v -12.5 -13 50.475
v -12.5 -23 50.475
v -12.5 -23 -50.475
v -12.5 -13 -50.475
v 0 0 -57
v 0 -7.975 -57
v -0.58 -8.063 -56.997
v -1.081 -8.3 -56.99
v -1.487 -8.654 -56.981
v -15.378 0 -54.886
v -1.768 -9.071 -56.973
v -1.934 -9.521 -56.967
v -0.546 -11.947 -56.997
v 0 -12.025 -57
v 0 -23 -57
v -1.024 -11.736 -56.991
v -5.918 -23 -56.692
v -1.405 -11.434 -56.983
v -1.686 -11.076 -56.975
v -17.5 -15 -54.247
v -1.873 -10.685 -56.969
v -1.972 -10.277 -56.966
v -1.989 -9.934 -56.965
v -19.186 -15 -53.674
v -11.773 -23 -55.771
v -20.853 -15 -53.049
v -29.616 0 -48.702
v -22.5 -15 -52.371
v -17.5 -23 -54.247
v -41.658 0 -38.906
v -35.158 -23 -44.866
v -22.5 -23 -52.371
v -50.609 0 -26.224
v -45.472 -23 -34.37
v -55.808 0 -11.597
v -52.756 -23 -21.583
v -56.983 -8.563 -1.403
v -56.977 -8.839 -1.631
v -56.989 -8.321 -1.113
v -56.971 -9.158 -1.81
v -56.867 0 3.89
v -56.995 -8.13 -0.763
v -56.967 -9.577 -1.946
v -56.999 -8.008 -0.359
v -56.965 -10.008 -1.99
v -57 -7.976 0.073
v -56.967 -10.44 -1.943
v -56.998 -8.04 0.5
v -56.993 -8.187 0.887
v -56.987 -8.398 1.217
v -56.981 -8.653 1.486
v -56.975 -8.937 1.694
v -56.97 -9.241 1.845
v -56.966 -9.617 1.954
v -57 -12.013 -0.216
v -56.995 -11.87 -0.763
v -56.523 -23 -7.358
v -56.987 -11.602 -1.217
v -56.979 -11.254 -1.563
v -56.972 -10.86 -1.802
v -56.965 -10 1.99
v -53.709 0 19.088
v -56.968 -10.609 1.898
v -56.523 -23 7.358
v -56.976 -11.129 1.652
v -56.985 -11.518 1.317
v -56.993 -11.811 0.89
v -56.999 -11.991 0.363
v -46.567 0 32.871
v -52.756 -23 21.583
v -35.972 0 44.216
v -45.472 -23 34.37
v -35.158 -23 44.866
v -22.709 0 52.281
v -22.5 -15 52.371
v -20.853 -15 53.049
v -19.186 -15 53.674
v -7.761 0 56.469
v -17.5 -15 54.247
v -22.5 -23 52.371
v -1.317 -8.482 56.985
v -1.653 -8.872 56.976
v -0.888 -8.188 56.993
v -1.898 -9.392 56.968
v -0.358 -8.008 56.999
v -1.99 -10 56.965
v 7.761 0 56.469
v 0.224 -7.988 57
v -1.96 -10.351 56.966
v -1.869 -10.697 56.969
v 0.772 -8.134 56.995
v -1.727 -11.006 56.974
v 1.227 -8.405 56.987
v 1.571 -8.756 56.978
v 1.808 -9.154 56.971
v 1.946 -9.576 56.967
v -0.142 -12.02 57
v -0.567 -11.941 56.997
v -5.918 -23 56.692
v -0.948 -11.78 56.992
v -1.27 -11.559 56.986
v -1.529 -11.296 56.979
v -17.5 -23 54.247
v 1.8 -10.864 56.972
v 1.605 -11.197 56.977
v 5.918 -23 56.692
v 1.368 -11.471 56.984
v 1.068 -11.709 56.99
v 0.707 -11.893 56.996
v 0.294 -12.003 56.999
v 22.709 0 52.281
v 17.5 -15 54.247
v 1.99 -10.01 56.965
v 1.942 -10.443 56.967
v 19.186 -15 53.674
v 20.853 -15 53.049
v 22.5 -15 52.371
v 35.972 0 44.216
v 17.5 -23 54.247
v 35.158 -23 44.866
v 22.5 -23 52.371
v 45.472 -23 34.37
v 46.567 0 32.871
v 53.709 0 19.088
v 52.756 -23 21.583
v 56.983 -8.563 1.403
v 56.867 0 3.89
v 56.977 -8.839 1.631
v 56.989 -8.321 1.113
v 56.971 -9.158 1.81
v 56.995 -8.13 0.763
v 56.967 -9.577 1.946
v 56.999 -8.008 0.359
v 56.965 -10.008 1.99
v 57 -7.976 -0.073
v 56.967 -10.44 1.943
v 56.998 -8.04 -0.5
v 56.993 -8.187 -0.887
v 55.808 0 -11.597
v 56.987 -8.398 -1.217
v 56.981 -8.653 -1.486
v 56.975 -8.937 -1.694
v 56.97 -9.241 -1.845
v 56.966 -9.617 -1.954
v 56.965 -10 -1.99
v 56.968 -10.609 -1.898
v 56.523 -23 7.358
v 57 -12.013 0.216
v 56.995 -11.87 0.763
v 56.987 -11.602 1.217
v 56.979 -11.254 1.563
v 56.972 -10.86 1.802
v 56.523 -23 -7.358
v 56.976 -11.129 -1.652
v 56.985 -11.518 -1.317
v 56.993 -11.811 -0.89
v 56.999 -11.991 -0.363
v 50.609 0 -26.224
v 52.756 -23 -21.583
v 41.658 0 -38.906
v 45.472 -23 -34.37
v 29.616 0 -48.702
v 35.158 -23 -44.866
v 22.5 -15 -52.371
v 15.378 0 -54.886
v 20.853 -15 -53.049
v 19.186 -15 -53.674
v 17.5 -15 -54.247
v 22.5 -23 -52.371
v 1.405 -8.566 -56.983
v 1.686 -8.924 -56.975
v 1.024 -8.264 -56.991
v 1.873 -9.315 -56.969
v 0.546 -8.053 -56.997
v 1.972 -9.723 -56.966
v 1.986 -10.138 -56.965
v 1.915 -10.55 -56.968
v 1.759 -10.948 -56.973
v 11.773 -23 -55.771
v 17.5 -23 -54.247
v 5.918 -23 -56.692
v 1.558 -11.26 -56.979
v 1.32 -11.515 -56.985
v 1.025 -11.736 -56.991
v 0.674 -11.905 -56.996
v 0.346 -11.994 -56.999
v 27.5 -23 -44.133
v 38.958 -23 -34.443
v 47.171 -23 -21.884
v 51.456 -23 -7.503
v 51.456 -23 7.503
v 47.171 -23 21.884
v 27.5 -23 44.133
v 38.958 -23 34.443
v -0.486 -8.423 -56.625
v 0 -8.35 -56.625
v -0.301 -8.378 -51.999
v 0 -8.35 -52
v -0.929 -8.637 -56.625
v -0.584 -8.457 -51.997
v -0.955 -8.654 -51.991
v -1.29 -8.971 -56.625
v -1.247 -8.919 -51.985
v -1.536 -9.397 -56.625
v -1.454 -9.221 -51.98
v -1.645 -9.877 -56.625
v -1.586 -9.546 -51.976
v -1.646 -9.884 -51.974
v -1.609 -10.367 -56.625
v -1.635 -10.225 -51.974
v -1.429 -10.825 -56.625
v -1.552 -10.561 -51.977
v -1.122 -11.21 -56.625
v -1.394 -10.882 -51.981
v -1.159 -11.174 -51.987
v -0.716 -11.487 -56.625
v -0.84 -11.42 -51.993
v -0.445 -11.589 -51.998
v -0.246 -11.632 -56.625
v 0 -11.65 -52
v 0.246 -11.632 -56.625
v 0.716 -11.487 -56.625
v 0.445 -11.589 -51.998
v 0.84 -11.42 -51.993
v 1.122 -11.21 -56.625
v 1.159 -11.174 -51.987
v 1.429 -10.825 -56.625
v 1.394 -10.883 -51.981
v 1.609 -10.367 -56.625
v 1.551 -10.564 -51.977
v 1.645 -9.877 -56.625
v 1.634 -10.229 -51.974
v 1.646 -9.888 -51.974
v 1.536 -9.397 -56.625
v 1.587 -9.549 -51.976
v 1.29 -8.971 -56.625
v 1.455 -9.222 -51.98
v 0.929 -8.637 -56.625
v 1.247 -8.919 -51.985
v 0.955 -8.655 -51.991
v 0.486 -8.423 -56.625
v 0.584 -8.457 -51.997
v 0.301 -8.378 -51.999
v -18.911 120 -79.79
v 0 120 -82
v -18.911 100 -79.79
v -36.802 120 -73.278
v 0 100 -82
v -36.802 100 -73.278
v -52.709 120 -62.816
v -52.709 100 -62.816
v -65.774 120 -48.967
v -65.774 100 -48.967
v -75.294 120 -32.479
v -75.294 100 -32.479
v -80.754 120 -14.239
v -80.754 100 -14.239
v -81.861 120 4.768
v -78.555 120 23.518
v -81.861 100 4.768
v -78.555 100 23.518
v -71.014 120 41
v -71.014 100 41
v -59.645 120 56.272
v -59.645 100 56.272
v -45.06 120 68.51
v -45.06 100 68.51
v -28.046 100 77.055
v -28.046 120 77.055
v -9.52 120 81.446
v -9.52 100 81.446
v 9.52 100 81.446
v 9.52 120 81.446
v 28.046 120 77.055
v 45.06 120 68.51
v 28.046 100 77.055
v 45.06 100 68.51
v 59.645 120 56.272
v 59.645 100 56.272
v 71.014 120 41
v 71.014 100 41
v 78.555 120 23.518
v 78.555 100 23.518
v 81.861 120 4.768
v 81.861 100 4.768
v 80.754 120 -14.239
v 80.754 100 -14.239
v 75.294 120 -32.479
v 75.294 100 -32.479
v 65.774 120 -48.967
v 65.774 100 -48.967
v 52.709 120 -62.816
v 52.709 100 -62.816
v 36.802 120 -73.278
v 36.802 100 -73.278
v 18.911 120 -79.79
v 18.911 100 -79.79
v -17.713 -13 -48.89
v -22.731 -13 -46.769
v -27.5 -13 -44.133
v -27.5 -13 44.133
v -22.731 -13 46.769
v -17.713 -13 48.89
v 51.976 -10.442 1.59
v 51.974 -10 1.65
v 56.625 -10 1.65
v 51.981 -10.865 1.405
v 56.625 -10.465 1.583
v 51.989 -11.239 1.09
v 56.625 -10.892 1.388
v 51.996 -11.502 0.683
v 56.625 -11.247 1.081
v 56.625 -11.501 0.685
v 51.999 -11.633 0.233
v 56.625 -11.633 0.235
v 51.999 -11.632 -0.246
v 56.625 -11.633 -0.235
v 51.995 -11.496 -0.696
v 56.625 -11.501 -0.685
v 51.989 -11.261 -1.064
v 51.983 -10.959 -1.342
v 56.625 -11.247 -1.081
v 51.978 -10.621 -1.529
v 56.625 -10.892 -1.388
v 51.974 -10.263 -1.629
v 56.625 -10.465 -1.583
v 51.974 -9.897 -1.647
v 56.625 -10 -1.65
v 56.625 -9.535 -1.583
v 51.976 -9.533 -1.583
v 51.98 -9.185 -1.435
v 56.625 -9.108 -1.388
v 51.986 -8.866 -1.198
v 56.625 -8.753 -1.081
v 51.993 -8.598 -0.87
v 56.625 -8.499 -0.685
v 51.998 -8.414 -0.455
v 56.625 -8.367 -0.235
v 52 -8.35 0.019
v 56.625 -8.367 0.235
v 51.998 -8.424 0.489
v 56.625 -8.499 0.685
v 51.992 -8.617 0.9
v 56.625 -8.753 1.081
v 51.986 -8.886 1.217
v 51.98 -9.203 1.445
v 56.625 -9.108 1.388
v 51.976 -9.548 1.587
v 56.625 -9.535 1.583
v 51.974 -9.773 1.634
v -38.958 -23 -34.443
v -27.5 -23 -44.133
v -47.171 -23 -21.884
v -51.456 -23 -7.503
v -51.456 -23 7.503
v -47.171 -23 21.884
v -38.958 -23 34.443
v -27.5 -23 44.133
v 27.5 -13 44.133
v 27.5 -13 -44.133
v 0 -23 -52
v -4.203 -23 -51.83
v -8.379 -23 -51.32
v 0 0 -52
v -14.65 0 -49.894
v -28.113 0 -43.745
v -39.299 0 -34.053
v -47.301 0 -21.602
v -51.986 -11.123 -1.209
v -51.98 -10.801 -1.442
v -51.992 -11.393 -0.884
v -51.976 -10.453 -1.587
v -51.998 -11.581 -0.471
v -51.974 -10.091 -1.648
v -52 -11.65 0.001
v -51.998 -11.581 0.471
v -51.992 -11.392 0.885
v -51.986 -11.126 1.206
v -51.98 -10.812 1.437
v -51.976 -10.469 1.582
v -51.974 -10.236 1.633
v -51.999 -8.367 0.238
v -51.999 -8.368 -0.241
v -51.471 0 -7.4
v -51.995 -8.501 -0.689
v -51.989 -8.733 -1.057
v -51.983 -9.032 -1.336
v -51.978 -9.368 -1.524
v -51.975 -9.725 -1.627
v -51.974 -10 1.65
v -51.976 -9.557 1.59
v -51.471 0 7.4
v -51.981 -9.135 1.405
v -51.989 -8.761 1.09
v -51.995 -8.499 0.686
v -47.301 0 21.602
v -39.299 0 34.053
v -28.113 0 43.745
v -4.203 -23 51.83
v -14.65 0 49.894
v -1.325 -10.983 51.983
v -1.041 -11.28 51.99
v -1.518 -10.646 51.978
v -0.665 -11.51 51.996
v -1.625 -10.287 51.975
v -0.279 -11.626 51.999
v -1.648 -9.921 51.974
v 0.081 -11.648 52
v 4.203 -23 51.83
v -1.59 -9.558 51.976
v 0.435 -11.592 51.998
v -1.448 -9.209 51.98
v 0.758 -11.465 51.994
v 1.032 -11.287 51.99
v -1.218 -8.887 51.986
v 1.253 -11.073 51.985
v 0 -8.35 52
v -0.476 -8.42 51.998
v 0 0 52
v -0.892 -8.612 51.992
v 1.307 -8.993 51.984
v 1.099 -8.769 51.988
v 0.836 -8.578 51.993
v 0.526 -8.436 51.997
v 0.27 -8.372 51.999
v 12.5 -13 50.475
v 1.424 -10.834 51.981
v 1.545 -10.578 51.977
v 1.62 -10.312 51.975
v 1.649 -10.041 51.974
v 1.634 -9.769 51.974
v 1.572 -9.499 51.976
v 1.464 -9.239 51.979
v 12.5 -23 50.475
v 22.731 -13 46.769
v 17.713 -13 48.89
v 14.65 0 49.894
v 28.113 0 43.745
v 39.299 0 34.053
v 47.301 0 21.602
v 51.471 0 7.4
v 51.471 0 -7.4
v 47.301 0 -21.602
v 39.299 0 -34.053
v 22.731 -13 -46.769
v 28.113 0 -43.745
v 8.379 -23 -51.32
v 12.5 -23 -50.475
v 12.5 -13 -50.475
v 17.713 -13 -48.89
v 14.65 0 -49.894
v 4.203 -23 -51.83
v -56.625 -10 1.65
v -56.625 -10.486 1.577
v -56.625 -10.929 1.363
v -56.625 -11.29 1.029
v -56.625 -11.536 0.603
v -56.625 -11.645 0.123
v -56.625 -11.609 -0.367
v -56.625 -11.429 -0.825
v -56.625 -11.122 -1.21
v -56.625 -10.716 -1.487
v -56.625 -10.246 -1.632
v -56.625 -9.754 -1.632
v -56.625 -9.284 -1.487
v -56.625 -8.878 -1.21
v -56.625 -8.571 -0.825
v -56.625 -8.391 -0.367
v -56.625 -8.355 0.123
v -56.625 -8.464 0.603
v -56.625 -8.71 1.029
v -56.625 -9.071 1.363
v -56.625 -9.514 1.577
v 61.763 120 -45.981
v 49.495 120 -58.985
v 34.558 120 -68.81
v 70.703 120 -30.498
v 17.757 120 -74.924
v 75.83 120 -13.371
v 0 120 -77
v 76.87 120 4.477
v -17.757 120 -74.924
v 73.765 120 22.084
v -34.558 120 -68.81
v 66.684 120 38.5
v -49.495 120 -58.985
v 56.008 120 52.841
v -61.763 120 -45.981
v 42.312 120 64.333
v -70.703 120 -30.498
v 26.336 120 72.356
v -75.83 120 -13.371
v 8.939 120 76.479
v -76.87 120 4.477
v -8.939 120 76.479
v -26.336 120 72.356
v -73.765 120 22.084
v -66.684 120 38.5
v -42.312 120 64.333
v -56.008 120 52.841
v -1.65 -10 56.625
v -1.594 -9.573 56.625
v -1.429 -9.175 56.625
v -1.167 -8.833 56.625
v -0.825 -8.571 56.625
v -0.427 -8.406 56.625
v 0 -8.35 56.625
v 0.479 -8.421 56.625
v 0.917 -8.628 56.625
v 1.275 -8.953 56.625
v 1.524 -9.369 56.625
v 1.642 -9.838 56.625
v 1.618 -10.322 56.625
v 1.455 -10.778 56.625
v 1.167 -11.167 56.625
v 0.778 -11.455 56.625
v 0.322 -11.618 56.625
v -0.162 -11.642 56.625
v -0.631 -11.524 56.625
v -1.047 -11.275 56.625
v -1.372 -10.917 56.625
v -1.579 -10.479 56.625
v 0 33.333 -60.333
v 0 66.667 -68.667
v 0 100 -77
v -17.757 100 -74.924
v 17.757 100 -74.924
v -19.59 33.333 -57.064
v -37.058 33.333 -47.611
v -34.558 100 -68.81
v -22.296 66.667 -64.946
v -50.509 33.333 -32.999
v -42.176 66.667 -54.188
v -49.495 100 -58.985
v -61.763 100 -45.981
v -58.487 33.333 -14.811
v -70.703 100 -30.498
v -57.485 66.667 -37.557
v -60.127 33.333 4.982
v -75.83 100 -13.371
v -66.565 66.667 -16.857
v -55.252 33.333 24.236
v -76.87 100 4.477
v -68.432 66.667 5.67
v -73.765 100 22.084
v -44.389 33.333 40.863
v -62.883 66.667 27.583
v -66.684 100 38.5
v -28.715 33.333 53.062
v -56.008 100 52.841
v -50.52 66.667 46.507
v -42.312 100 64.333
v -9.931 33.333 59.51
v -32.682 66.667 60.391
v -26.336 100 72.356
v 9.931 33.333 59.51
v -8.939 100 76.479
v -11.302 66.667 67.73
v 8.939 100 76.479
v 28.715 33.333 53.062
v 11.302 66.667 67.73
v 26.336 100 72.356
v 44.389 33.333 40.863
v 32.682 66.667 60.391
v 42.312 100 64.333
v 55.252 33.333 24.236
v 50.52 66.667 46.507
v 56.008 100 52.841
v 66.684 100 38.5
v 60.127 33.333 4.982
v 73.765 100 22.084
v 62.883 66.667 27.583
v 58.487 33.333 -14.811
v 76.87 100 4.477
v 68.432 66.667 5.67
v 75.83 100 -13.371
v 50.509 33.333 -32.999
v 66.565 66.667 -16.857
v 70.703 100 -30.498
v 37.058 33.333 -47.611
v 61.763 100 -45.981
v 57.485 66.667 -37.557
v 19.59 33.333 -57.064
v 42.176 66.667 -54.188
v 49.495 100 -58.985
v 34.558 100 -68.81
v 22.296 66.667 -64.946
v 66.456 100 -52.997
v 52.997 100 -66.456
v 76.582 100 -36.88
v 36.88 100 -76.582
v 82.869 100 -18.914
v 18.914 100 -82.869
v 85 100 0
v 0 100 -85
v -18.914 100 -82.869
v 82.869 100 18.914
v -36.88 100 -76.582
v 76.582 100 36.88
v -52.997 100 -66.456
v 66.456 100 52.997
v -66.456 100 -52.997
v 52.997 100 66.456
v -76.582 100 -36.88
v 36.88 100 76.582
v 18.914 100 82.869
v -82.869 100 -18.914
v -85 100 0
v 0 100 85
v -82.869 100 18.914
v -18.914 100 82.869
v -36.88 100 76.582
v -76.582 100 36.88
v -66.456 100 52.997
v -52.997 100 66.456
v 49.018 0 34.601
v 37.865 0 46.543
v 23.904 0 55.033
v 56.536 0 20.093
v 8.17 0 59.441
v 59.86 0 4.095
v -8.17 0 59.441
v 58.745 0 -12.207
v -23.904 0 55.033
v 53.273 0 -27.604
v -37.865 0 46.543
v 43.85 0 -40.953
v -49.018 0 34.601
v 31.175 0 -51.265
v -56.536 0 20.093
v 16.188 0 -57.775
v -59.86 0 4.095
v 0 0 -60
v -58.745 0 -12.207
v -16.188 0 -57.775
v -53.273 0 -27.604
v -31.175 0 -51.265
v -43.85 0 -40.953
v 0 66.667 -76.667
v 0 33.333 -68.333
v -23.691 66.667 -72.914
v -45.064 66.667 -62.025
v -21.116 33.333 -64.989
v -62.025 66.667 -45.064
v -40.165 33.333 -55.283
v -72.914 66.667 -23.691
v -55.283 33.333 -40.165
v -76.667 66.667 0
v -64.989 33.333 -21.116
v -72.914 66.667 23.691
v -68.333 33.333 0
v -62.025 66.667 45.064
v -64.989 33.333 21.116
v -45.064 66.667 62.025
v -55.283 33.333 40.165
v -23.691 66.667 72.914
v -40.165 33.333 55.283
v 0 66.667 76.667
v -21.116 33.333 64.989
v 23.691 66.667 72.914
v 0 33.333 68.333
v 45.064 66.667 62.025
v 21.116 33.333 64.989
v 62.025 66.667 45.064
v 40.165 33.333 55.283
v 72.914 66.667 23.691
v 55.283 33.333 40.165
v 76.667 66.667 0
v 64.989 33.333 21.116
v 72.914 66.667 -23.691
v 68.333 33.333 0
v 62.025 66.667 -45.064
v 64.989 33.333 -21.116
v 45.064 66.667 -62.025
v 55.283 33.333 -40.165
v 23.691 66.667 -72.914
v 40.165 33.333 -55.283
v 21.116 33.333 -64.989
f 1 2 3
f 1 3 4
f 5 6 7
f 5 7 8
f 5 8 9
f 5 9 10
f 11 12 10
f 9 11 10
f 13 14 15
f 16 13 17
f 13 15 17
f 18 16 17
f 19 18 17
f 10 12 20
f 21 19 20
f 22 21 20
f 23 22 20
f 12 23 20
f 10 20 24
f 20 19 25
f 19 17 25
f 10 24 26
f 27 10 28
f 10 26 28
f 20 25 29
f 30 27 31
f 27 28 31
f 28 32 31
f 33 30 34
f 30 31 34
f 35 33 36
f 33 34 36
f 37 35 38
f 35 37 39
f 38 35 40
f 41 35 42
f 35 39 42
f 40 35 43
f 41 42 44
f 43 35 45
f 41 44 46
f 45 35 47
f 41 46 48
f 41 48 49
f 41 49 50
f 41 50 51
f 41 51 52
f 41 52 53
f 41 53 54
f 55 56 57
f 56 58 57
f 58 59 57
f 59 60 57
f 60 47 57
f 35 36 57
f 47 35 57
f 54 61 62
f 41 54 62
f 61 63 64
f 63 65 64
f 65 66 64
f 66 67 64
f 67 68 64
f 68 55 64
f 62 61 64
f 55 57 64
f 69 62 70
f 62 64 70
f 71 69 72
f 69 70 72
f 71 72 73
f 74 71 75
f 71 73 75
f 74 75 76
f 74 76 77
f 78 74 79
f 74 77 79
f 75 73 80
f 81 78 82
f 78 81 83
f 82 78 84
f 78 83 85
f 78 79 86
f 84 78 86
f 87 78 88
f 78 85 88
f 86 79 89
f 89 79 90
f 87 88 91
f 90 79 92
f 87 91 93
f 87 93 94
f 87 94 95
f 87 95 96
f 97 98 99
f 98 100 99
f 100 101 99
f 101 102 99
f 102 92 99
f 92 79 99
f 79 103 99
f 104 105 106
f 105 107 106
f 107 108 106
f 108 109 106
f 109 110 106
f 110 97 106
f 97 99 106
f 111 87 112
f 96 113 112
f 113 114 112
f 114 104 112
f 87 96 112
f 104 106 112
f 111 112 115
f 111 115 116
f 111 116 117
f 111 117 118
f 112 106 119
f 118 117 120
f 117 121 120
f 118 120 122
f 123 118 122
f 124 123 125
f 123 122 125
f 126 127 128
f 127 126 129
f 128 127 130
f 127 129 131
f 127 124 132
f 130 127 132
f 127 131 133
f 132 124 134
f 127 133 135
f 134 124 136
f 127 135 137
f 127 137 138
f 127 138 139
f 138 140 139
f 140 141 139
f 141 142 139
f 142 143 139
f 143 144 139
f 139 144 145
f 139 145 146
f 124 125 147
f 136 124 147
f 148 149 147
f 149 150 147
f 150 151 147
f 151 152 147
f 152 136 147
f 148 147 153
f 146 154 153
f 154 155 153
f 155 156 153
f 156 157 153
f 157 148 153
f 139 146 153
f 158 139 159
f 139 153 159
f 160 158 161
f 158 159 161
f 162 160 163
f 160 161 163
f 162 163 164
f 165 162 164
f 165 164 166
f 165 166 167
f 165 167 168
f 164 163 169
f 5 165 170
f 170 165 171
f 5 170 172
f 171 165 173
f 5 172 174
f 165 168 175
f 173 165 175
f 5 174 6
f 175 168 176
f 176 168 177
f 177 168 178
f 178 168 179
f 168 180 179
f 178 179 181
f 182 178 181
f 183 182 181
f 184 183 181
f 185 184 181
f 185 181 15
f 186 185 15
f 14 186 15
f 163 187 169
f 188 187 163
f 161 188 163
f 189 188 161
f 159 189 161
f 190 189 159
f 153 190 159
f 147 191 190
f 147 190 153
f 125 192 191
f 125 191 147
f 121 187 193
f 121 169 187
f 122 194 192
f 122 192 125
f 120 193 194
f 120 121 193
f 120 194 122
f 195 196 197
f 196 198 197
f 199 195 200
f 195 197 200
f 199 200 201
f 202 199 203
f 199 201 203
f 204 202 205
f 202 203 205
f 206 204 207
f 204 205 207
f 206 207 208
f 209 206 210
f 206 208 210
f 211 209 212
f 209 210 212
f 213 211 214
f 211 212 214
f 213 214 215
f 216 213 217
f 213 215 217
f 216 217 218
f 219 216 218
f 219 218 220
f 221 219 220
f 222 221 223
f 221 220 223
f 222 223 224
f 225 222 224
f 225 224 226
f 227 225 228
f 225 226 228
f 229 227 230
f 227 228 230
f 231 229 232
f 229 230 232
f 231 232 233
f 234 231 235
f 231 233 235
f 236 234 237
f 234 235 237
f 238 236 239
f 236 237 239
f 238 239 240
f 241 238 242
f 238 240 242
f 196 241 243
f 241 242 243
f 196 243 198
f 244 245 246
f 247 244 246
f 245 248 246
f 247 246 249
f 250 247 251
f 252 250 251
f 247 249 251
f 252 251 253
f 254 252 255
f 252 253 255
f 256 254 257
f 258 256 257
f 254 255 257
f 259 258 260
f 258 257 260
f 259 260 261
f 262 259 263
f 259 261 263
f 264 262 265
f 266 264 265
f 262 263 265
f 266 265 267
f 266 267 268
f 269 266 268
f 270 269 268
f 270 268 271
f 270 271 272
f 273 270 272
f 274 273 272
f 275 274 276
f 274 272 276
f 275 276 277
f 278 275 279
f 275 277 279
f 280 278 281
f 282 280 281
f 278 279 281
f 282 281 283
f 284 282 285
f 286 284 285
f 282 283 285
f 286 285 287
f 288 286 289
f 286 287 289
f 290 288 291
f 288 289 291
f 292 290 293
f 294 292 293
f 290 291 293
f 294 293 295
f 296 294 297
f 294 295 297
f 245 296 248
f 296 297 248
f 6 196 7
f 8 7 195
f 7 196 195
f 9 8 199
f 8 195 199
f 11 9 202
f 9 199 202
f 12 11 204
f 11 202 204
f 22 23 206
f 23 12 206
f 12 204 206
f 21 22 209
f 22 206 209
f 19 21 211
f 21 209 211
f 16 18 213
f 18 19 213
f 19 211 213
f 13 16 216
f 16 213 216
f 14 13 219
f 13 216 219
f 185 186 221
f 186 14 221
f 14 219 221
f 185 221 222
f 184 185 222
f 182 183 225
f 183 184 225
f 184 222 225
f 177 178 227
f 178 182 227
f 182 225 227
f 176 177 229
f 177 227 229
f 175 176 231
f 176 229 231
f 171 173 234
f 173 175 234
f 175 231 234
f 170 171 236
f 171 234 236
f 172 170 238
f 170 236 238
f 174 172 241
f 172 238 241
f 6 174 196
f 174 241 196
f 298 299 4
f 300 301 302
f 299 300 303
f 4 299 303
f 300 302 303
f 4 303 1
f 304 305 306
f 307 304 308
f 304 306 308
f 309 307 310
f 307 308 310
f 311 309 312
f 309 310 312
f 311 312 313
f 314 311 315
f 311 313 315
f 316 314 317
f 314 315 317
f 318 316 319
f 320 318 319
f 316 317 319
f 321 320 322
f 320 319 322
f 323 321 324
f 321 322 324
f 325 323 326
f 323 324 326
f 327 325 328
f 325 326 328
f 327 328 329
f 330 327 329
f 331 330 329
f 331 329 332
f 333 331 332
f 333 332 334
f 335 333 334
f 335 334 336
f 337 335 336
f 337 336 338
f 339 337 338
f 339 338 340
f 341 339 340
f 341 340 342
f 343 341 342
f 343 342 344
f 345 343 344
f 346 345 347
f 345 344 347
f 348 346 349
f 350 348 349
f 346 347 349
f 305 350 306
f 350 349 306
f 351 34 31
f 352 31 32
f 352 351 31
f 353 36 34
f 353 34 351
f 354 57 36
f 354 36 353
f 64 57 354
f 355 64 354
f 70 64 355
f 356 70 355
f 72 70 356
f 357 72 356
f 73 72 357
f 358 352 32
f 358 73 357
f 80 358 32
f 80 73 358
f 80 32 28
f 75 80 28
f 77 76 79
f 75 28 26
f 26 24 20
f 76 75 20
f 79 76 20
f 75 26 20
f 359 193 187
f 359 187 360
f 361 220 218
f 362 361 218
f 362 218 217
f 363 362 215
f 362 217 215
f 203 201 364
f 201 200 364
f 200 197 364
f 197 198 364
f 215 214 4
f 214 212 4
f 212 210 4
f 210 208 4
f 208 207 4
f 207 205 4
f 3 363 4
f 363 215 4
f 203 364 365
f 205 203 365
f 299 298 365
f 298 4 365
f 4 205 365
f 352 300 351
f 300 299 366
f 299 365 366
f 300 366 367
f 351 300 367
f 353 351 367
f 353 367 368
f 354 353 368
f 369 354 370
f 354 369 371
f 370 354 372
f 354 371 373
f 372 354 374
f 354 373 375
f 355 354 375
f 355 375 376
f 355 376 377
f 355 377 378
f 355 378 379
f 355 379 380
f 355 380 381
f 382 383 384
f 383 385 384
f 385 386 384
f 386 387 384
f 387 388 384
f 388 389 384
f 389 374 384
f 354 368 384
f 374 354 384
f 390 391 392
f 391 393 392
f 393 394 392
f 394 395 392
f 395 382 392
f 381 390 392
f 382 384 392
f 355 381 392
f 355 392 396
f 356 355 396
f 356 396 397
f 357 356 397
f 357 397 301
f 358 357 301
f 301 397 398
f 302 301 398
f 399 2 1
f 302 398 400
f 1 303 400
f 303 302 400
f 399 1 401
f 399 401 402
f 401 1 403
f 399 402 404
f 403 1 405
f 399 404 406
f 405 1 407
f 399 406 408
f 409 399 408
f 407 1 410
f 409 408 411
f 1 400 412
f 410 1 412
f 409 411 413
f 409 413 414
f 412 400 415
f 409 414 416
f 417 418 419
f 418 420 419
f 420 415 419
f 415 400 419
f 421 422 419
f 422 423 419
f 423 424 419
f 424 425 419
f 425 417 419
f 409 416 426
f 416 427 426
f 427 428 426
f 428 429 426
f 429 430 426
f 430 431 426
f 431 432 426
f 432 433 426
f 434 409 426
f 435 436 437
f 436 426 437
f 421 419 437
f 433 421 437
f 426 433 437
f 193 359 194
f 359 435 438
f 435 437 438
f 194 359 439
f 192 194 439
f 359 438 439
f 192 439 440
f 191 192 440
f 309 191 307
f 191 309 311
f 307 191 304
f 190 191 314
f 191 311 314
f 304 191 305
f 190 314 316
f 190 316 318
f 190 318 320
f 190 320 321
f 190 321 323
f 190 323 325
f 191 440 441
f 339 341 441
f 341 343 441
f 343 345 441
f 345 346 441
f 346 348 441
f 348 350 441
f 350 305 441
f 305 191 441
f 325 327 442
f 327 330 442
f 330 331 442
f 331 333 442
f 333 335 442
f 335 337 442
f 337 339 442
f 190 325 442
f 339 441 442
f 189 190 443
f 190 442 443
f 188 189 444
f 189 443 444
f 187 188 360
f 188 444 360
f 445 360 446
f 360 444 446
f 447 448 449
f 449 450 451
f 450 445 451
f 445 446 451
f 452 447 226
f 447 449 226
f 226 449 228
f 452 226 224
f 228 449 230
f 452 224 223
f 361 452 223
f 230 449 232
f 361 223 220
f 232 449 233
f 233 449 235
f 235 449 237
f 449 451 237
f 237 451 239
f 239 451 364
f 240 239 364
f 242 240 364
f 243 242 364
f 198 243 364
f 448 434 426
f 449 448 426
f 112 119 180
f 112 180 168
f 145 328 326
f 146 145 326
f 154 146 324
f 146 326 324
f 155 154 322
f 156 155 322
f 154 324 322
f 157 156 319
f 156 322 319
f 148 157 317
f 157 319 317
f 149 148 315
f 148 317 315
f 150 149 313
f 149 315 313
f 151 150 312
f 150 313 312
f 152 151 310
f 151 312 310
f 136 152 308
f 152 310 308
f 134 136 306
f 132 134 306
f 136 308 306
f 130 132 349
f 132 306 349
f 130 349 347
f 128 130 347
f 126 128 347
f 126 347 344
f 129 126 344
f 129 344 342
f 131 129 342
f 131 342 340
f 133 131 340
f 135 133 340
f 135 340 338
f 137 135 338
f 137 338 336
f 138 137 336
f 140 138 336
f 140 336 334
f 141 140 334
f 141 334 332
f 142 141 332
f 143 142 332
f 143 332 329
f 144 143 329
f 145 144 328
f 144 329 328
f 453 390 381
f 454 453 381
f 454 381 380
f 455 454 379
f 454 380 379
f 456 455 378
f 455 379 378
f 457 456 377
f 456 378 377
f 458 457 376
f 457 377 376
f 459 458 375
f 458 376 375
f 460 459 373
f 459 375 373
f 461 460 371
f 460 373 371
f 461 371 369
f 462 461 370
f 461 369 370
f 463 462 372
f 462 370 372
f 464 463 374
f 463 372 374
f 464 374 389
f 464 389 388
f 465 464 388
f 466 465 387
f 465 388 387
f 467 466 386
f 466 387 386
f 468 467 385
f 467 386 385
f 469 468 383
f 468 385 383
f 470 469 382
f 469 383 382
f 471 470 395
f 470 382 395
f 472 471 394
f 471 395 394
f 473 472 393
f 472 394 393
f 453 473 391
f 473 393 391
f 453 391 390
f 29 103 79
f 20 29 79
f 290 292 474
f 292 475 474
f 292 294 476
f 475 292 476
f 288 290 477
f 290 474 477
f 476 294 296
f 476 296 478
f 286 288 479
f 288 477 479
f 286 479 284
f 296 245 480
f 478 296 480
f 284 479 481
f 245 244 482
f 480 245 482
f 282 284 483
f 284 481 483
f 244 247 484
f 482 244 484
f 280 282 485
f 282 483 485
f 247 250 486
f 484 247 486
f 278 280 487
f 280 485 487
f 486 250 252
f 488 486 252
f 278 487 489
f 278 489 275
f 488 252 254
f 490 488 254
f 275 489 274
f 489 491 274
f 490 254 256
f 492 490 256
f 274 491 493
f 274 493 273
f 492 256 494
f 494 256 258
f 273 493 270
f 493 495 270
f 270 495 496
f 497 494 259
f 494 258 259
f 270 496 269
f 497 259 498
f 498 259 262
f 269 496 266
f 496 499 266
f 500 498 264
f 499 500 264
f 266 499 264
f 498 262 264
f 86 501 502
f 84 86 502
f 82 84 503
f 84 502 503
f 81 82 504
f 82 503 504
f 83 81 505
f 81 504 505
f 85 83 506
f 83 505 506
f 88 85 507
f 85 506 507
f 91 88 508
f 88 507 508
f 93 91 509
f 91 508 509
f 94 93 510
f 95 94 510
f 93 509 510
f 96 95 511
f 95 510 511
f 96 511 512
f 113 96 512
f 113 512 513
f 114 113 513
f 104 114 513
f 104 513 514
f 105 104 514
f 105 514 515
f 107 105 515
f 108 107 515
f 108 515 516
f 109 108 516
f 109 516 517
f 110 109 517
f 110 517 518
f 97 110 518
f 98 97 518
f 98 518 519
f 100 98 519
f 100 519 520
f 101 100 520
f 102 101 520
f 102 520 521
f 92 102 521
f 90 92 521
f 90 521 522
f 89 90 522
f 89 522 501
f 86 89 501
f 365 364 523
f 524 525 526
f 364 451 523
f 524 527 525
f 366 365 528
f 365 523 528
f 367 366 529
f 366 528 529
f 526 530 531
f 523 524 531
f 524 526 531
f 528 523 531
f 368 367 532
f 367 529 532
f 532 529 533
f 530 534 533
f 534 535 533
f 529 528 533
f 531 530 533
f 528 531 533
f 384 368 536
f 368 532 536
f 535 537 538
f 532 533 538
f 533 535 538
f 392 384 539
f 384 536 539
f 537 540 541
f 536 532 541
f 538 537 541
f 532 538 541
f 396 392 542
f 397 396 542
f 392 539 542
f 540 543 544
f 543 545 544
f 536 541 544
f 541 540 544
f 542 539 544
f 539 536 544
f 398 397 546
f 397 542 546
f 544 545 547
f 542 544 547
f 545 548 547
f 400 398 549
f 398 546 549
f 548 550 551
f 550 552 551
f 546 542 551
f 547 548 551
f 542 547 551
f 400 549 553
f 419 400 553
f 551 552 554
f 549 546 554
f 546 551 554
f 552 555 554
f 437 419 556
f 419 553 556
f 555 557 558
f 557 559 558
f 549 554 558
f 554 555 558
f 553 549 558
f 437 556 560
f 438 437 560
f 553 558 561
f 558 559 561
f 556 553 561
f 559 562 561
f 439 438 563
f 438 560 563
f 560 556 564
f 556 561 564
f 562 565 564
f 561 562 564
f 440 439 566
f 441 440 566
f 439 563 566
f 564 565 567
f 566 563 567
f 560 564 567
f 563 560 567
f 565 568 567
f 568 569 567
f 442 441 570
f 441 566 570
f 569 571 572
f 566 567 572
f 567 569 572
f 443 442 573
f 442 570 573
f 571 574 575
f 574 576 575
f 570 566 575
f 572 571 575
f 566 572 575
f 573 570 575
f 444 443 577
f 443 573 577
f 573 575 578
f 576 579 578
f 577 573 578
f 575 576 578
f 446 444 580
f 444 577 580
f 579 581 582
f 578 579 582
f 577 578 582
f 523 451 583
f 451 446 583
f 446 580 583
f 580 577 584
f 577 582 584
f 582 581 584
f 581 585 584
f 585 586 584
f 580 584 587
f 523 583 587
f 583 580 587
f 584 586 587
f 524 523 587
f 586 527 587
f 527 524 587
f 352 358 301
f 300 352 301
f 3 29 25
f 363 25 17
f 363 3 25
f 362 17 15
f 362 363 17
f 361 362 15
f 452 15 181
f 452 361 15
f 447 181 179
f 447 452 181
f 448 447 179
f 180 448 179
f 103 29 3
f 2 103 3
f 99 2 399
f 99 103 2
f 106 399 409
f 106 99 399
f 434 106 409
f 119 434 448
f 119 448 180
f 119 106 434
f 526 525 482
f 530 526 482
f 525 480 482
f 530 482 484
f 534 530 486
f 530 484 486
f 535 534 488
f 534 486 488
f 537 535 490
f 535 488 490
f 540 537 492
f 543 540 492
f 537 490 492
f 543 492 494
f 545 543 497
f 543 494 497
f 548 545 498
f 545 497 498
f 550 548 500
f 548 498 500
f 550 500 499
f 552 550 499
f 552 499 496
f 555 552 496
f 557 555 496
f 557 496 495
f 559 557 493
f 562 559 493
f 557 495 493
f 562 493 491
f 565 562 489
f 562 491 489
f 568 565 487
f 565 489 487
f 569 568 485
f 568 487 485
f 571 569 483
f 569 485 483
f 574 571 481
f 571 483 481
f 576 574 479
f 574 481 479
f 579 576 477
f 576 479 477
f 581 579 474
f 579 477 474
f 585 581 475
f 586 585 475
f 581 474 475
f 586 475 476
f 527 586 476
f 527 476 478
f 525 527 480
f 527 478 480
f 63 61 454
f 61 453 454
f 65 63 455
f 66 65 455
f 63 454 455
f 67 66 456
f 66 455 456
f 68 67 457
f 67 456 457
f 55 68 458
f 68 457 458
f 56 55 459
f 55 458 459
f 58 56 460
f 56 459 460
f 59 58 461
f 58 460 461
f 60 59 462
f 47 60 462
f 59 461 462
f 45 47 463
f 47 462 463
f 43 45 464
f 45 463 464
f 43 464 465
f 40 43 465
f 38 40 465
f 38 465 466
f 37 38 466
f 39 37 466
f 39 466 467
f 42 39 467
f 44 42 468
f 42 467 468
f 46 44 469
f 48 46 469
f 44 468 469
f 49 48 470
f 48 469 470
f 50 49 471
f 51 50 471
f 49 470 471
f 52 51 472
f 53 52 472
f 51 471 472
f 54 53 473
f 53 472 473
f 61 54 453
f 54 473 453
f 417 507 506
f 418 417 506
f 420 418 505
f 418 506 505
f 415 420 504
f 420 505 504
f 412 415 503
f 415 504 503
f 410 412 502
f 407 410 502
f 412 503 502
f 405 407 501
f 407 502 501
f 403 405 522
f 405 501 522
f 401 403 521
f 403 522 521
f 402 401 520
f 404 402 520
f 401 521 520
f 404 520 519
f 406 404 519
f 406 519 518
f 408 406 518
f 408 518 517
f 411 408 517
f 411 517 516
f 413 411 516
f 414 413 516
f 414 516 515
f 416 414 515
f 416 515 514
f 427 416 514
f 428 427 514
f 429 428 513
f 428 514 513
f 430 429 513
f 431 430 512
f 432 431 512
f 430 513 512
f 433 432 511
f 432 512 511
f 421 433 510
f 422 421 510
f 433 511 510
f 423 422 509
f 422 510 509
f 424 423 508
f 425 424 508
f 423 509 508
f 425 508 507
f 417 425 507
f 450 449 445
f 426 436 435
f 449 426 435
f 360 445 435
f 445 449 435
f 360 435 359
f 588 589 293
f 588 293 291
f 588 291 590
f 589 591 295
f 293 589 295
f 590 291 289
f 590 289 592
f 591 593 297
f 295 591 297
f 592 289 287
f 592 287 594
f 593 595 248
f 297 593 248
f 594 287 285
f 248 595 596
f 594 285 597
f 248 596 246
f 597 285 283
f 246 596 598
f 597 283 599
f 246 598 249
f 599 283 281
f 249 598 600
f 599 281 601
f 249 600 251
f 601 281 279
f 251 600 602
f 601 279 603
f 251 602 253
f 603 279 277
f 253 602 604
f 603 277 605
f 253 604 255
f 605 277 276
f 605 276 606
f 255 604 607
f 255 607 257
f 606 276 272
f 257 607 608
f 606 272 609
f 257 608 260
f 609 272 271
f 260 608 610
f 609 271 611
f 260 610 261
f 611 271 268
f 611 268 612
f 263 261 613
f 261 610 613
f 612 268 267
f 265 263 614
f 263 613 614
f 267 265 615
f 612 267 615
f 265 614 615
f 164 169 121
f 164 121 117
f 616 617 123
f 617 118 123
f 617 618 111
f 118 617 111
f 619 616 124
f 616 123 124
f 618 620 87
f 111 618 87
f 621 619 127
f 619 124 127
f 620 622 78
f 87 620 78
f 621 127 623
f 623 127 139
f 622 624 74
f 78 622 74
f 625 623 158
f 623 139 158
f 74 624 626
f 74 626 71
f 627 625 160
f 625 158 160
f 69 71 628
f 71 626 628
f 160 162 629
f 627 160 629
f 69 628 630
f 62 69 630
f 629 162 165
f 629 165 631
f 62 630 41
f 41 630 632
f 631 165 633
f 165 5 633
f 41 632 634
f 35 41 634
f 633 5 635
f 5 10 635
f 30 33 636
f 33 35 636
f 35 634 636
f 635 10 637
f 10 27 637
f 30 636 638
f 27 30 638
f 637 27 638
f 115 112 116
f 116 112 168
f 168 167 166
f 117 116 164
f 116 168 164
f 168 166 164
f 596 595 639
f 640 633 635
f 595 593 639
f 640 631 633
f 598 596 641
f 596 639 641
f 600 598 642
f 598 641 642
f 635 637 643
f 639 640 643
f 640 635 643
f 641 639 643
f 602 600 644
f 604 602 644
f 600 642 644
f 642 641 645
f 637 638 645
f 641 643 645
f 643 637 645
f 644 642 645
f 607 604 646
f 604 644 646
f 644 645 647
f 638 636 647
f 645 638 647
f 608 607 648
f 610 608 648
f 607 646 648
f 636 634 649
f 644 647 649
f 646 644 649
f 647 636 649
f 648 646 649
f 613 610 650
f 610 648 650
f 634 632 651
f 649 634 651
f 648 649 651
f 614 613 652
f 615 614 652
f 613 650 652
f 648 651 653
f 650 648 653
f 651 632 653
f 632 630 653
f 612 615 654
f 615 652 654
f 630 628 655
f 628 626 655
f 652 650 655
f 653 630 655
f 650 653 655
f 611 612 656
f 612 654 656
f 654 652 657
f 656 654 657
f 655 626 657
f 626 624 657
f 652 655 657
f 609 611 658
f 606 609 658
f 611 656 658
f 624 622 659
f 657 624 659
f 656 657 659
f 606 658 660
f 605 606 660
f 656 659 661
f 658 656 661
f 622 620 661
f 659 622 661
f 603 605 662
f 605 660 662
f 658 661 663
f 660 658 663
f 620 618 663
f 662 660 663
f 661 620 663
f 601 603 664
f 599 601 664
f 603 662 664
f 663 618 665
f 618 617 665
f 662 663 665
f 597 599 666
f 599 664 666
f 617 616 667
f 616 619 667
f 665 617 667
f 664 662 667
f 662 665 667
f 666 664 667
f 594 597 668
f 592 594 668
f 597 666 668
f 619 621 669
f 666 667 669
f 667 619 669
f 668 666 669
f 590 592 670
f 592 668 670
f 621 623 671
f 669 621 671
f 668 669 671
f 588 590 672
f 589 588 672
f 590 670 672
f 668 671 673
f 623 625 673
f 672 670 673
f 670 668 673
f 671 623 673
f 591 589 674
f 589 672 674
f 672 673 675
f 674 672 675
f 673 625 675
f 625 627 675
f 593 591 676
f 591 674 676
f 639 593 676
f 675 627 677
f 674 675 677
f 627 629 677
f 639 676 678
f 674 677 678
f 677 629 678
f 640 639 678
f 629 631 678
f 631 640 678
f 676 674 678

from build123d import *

# Parameters (mm, degrees)
BOSS_EXTRUDE1_REACH                   = 171.853
BOSS_EXTRUDE1_END_RADIUS              = 52
SKETCH3_W                             = 15
SKETCH3_H                             = 10
BOSS_EXTRUDE1_DIRECTION_2_REACH       = 171.853
BOSS_EXTRUDE1_DIRECTION_2_END_RADIUS  = 52
CUT_EXTRUDE1_DEPTH                    = 170.852877515
CUT_EXTRUDE1_DEPTH_BACK               = 170.852877515
SKETCH4_W                             = 5
SKETCH4_H                             = 8
M4_TAPPED_HOLE1_D                     = 3.3
M4_TAPPED_HOLE1_CSINK_D               = 4.05
M4_TAPPED_HOLE1_CSINK_ANGLE           = 90
M4_TAPPED_HOLE1_ON_FACE_2_D           = 3.3
M4_TAPPED_HOLE1_ON_FACE_2_CSINK_D     = 4.05
M4_TAPPED_HOLE1_ON_FACE_2_CSINK_ANGLE = 90
M4_TAPPED_HOLE1_ON_FACE_3_D           = 3.3
M4_TAPPED_HOLE1_ON_FACE_3_CSINK_D     = 4.05
M4_TAPPED_HOLE1_ON_FACE_3_CSINK_ANGLE = 90
M4_TAPPED_HOLE1_ON_FACE_4_D           = 3.3
M4_TAPPED_HOLE1_ON_FACE_4_CSINK_D     = 4.05
M4_TAPPED_HOLE1_ON_FACE_4_CSINK_ANGLE = 90


with BuildPart() as part:
    # Sketch1 → Revolve1 (revolve)
    with BuildSketch(Plane.XY, mode=Mode.PRIVATE) as revolve1_sk:
        Polygon((77, 120), (82, 120), (82, 100), (85, 100), (60, 0), (57, 0), (57, -23), (52, -23), (52, 0), (77, 100), align=None)
    revolve(revolve1_sk.sketch.rotate(Axis((0, 0, 0), (0, 1, 0)), 90), axis=Axis((0, 0, 0), (0, 1, 0)))

    # Boss-Extrude1: up to this cylinder (the profile starts inside it)
    boss_extrude1_end = Plane(origin=(0, -18, 0), z_dir=(0, -1, 0)) * Cylinder(BOSS_EXTRUDE1_END_RADIUS, 448.706, mode=Mode.PRIVATE)
    # Sketch3 → Boss-Extrude1 (add, up to the surface)
    with BuildSketch(Plane.XY, mode=Mode.PRIVATE) as boss_extrude1_sk1:
        with Locations((20, -18)):
            Rectangle(SKETCH3_W, SKETCH3_H)
    boss_extrude1_tool1 = extrude(boss_extrude1_sk1.sketch, amount=BOSS_EXTRUDE1_REACH, mode=Mode.PRIVATE) & boss_extrude1_end
    add(boss_extrude1_tool1.solids().sort_by_distance((20, -18, 0))[0])
    # Sketch3 → Boss-Extrude1 (add, up to the surface)
    with BuildSketch(Plane.XY, mode=Mode.PRIVATE) as boss_extrude1_sk2:
        with Locations((-20, -18)):
            Rectangle(SKETCH3_W, SKETCH3_H)
    boss_extrude1_tool2 = extrude(boss_extrude1_sk2.sketch, amount=BOSS_EXTRUDE1_REACH, mode=Mode.PRIVATE) & boss_extrude1_end
    add(boss_extrude1_tool2.solids().sort_by_distance((-20, -18, 0))[0])

    # Boss-Extrude1 direction 2: up to this cylinder (the profile starts inside it)
    boss_extrude1_direction_2_end = Plane(origin=(0, -18, 0), z_dir=(0, -1, 0)) * Cylinder(BOSS_EXTRUDE1_DIRECTION_2_END_RADIUS, 448.706, mode=Mode.PRIVATE)
    # Sketch3 → Boss-Extrude1 direction 2 (add, up to the surface)
    with BuildSketch(Plane.XY, mode=Mode.PRIVATE) as boss_extrude1_direction_2_sk1:
        with Locations((20, -18)):
            Rectangle(SKETCH3_W, SKETCH3_H)
    boss_extrude1_direction_2_tool1 = extrude(boss_extrude1_direction_2_sk1.sketch, amount=-BOSS_EXTRUDE1_DIRECTION_2_REACH, mode=Mode.PRIVATE) & boss_extrude1_direction_2_end
    add(boss_extrude1_direction_2_tool1.solids().sort_by_distance((20, -18, 0))[0])
    # Sketch3 → Boss-Extrude1 direction 2 (add, up to the surface)
    with BuildSketch(Plane.XY, mode=Mode.PRIVATE) as boss_extrude1_direction_2_sk2:
        with Locations((-20, -18)):
            Rectangle(SKETCH3_W, SKETCH3_H)
    boss_extrude1_direction_2_tool2 = extrude(boss_extrude1_direction_2_sk2.sketch, amount=-BOSS_EXTRUDE1_DIRECTION_2_REACH, mode=Mode.PRIVATE) & boss_extrude1_direction_2_end
    add(boss_extrude1_direction_2_tool2.solids().sort_by_distance((-20, -18, 0))[0])

    # Sketch4 → Cut-Extrude1 (cut, two sides: drawn at the far end of the back side and taken through both)
    with BuildSketch(Plane.XY.offset(-CUT_EXTRUDE1_DEPTH_BACK)):
        with Locations((-20, -19)):
            Rectangle(SKETCH4_W, SKETCH4_H)
        with Locations((20, -19)):
            Rectangle(SKETCH4_W, SKETCH4_H)
    extrude(amount=CUT_EXTRUDE1_DEPTH + CUT_EXTRUDE1_DEPTH_BACK, mode=Mode.SUBTRACT)

    # M4 Tapped Hole1 (through all)
    with Locations(Plane(origin=(0, -10, -57), x_dir=(0, -1, 0), z_dir=(0, 0, -1))):
        with Locations((0, 0)):
            CounterSinkHole(M4_TAPPED_HOLE1_D / 2, M4_TAPPED_HOLE1_CSINK_D / 2, counter_sink_angle=M4_TAPPED_HOLE1_CSINK_ANGLE)

    # M4 Tapped Hole1 on face 2 (through all)
    with Locations(Plane(origin=(-57, -10, 0), x_dir=(0, 0, -1), z_dir=(-1, 0, 0))):
        with Locations((0, 0)):
            CounterSinkHole(M4_TAPPED_HOLE1_ON_FACE_2_D / 2, M4_TAPPED_HOLE1_ON_FACE_2_CSINK_D / 2, counter_sink_angle=M4_TAPPED_HOLE1_ON_FACE_2_CSINK_ANGLE)

    # M4 Tapped Hole1 on face 3 (through all)
    with Locations(Plane(origin=(0, -10, 57), x_dir=(1, 0, 0), z_dir=(0, 0, 1))):
        with Locations((0, 0)):
            CounterSinkHole(M4_TAPPED_HOLE1_ON_FACE_3_D / 2, M4_TAPPED_HOLE1_ON_FACE_3_CSINK_D / 2, counter_sink_angle=M4_TAPPED_HOLE1_ON_FACE_3_CSINK_ANGLE)

    # M4 Tapped Hole1 on face 4 (through all)
    with Locations(Plane(origin=(57, -10, 0), x_dir=(0, 0, 1), z_dir=(1, 0, 0))):
        with Locations((0, 0)):
            CounterSinkHole(M4_TAPPED_HOLE1_ON_FACE_4_D / 2, M4_TAPPED_HOLE1_ON_FACE_4_CSINK_D / 2, counter_sink_angle=M4_TAPPED_HOLE1_ON_FACE_4_CSINK_ANGLE)


solid = part.part
